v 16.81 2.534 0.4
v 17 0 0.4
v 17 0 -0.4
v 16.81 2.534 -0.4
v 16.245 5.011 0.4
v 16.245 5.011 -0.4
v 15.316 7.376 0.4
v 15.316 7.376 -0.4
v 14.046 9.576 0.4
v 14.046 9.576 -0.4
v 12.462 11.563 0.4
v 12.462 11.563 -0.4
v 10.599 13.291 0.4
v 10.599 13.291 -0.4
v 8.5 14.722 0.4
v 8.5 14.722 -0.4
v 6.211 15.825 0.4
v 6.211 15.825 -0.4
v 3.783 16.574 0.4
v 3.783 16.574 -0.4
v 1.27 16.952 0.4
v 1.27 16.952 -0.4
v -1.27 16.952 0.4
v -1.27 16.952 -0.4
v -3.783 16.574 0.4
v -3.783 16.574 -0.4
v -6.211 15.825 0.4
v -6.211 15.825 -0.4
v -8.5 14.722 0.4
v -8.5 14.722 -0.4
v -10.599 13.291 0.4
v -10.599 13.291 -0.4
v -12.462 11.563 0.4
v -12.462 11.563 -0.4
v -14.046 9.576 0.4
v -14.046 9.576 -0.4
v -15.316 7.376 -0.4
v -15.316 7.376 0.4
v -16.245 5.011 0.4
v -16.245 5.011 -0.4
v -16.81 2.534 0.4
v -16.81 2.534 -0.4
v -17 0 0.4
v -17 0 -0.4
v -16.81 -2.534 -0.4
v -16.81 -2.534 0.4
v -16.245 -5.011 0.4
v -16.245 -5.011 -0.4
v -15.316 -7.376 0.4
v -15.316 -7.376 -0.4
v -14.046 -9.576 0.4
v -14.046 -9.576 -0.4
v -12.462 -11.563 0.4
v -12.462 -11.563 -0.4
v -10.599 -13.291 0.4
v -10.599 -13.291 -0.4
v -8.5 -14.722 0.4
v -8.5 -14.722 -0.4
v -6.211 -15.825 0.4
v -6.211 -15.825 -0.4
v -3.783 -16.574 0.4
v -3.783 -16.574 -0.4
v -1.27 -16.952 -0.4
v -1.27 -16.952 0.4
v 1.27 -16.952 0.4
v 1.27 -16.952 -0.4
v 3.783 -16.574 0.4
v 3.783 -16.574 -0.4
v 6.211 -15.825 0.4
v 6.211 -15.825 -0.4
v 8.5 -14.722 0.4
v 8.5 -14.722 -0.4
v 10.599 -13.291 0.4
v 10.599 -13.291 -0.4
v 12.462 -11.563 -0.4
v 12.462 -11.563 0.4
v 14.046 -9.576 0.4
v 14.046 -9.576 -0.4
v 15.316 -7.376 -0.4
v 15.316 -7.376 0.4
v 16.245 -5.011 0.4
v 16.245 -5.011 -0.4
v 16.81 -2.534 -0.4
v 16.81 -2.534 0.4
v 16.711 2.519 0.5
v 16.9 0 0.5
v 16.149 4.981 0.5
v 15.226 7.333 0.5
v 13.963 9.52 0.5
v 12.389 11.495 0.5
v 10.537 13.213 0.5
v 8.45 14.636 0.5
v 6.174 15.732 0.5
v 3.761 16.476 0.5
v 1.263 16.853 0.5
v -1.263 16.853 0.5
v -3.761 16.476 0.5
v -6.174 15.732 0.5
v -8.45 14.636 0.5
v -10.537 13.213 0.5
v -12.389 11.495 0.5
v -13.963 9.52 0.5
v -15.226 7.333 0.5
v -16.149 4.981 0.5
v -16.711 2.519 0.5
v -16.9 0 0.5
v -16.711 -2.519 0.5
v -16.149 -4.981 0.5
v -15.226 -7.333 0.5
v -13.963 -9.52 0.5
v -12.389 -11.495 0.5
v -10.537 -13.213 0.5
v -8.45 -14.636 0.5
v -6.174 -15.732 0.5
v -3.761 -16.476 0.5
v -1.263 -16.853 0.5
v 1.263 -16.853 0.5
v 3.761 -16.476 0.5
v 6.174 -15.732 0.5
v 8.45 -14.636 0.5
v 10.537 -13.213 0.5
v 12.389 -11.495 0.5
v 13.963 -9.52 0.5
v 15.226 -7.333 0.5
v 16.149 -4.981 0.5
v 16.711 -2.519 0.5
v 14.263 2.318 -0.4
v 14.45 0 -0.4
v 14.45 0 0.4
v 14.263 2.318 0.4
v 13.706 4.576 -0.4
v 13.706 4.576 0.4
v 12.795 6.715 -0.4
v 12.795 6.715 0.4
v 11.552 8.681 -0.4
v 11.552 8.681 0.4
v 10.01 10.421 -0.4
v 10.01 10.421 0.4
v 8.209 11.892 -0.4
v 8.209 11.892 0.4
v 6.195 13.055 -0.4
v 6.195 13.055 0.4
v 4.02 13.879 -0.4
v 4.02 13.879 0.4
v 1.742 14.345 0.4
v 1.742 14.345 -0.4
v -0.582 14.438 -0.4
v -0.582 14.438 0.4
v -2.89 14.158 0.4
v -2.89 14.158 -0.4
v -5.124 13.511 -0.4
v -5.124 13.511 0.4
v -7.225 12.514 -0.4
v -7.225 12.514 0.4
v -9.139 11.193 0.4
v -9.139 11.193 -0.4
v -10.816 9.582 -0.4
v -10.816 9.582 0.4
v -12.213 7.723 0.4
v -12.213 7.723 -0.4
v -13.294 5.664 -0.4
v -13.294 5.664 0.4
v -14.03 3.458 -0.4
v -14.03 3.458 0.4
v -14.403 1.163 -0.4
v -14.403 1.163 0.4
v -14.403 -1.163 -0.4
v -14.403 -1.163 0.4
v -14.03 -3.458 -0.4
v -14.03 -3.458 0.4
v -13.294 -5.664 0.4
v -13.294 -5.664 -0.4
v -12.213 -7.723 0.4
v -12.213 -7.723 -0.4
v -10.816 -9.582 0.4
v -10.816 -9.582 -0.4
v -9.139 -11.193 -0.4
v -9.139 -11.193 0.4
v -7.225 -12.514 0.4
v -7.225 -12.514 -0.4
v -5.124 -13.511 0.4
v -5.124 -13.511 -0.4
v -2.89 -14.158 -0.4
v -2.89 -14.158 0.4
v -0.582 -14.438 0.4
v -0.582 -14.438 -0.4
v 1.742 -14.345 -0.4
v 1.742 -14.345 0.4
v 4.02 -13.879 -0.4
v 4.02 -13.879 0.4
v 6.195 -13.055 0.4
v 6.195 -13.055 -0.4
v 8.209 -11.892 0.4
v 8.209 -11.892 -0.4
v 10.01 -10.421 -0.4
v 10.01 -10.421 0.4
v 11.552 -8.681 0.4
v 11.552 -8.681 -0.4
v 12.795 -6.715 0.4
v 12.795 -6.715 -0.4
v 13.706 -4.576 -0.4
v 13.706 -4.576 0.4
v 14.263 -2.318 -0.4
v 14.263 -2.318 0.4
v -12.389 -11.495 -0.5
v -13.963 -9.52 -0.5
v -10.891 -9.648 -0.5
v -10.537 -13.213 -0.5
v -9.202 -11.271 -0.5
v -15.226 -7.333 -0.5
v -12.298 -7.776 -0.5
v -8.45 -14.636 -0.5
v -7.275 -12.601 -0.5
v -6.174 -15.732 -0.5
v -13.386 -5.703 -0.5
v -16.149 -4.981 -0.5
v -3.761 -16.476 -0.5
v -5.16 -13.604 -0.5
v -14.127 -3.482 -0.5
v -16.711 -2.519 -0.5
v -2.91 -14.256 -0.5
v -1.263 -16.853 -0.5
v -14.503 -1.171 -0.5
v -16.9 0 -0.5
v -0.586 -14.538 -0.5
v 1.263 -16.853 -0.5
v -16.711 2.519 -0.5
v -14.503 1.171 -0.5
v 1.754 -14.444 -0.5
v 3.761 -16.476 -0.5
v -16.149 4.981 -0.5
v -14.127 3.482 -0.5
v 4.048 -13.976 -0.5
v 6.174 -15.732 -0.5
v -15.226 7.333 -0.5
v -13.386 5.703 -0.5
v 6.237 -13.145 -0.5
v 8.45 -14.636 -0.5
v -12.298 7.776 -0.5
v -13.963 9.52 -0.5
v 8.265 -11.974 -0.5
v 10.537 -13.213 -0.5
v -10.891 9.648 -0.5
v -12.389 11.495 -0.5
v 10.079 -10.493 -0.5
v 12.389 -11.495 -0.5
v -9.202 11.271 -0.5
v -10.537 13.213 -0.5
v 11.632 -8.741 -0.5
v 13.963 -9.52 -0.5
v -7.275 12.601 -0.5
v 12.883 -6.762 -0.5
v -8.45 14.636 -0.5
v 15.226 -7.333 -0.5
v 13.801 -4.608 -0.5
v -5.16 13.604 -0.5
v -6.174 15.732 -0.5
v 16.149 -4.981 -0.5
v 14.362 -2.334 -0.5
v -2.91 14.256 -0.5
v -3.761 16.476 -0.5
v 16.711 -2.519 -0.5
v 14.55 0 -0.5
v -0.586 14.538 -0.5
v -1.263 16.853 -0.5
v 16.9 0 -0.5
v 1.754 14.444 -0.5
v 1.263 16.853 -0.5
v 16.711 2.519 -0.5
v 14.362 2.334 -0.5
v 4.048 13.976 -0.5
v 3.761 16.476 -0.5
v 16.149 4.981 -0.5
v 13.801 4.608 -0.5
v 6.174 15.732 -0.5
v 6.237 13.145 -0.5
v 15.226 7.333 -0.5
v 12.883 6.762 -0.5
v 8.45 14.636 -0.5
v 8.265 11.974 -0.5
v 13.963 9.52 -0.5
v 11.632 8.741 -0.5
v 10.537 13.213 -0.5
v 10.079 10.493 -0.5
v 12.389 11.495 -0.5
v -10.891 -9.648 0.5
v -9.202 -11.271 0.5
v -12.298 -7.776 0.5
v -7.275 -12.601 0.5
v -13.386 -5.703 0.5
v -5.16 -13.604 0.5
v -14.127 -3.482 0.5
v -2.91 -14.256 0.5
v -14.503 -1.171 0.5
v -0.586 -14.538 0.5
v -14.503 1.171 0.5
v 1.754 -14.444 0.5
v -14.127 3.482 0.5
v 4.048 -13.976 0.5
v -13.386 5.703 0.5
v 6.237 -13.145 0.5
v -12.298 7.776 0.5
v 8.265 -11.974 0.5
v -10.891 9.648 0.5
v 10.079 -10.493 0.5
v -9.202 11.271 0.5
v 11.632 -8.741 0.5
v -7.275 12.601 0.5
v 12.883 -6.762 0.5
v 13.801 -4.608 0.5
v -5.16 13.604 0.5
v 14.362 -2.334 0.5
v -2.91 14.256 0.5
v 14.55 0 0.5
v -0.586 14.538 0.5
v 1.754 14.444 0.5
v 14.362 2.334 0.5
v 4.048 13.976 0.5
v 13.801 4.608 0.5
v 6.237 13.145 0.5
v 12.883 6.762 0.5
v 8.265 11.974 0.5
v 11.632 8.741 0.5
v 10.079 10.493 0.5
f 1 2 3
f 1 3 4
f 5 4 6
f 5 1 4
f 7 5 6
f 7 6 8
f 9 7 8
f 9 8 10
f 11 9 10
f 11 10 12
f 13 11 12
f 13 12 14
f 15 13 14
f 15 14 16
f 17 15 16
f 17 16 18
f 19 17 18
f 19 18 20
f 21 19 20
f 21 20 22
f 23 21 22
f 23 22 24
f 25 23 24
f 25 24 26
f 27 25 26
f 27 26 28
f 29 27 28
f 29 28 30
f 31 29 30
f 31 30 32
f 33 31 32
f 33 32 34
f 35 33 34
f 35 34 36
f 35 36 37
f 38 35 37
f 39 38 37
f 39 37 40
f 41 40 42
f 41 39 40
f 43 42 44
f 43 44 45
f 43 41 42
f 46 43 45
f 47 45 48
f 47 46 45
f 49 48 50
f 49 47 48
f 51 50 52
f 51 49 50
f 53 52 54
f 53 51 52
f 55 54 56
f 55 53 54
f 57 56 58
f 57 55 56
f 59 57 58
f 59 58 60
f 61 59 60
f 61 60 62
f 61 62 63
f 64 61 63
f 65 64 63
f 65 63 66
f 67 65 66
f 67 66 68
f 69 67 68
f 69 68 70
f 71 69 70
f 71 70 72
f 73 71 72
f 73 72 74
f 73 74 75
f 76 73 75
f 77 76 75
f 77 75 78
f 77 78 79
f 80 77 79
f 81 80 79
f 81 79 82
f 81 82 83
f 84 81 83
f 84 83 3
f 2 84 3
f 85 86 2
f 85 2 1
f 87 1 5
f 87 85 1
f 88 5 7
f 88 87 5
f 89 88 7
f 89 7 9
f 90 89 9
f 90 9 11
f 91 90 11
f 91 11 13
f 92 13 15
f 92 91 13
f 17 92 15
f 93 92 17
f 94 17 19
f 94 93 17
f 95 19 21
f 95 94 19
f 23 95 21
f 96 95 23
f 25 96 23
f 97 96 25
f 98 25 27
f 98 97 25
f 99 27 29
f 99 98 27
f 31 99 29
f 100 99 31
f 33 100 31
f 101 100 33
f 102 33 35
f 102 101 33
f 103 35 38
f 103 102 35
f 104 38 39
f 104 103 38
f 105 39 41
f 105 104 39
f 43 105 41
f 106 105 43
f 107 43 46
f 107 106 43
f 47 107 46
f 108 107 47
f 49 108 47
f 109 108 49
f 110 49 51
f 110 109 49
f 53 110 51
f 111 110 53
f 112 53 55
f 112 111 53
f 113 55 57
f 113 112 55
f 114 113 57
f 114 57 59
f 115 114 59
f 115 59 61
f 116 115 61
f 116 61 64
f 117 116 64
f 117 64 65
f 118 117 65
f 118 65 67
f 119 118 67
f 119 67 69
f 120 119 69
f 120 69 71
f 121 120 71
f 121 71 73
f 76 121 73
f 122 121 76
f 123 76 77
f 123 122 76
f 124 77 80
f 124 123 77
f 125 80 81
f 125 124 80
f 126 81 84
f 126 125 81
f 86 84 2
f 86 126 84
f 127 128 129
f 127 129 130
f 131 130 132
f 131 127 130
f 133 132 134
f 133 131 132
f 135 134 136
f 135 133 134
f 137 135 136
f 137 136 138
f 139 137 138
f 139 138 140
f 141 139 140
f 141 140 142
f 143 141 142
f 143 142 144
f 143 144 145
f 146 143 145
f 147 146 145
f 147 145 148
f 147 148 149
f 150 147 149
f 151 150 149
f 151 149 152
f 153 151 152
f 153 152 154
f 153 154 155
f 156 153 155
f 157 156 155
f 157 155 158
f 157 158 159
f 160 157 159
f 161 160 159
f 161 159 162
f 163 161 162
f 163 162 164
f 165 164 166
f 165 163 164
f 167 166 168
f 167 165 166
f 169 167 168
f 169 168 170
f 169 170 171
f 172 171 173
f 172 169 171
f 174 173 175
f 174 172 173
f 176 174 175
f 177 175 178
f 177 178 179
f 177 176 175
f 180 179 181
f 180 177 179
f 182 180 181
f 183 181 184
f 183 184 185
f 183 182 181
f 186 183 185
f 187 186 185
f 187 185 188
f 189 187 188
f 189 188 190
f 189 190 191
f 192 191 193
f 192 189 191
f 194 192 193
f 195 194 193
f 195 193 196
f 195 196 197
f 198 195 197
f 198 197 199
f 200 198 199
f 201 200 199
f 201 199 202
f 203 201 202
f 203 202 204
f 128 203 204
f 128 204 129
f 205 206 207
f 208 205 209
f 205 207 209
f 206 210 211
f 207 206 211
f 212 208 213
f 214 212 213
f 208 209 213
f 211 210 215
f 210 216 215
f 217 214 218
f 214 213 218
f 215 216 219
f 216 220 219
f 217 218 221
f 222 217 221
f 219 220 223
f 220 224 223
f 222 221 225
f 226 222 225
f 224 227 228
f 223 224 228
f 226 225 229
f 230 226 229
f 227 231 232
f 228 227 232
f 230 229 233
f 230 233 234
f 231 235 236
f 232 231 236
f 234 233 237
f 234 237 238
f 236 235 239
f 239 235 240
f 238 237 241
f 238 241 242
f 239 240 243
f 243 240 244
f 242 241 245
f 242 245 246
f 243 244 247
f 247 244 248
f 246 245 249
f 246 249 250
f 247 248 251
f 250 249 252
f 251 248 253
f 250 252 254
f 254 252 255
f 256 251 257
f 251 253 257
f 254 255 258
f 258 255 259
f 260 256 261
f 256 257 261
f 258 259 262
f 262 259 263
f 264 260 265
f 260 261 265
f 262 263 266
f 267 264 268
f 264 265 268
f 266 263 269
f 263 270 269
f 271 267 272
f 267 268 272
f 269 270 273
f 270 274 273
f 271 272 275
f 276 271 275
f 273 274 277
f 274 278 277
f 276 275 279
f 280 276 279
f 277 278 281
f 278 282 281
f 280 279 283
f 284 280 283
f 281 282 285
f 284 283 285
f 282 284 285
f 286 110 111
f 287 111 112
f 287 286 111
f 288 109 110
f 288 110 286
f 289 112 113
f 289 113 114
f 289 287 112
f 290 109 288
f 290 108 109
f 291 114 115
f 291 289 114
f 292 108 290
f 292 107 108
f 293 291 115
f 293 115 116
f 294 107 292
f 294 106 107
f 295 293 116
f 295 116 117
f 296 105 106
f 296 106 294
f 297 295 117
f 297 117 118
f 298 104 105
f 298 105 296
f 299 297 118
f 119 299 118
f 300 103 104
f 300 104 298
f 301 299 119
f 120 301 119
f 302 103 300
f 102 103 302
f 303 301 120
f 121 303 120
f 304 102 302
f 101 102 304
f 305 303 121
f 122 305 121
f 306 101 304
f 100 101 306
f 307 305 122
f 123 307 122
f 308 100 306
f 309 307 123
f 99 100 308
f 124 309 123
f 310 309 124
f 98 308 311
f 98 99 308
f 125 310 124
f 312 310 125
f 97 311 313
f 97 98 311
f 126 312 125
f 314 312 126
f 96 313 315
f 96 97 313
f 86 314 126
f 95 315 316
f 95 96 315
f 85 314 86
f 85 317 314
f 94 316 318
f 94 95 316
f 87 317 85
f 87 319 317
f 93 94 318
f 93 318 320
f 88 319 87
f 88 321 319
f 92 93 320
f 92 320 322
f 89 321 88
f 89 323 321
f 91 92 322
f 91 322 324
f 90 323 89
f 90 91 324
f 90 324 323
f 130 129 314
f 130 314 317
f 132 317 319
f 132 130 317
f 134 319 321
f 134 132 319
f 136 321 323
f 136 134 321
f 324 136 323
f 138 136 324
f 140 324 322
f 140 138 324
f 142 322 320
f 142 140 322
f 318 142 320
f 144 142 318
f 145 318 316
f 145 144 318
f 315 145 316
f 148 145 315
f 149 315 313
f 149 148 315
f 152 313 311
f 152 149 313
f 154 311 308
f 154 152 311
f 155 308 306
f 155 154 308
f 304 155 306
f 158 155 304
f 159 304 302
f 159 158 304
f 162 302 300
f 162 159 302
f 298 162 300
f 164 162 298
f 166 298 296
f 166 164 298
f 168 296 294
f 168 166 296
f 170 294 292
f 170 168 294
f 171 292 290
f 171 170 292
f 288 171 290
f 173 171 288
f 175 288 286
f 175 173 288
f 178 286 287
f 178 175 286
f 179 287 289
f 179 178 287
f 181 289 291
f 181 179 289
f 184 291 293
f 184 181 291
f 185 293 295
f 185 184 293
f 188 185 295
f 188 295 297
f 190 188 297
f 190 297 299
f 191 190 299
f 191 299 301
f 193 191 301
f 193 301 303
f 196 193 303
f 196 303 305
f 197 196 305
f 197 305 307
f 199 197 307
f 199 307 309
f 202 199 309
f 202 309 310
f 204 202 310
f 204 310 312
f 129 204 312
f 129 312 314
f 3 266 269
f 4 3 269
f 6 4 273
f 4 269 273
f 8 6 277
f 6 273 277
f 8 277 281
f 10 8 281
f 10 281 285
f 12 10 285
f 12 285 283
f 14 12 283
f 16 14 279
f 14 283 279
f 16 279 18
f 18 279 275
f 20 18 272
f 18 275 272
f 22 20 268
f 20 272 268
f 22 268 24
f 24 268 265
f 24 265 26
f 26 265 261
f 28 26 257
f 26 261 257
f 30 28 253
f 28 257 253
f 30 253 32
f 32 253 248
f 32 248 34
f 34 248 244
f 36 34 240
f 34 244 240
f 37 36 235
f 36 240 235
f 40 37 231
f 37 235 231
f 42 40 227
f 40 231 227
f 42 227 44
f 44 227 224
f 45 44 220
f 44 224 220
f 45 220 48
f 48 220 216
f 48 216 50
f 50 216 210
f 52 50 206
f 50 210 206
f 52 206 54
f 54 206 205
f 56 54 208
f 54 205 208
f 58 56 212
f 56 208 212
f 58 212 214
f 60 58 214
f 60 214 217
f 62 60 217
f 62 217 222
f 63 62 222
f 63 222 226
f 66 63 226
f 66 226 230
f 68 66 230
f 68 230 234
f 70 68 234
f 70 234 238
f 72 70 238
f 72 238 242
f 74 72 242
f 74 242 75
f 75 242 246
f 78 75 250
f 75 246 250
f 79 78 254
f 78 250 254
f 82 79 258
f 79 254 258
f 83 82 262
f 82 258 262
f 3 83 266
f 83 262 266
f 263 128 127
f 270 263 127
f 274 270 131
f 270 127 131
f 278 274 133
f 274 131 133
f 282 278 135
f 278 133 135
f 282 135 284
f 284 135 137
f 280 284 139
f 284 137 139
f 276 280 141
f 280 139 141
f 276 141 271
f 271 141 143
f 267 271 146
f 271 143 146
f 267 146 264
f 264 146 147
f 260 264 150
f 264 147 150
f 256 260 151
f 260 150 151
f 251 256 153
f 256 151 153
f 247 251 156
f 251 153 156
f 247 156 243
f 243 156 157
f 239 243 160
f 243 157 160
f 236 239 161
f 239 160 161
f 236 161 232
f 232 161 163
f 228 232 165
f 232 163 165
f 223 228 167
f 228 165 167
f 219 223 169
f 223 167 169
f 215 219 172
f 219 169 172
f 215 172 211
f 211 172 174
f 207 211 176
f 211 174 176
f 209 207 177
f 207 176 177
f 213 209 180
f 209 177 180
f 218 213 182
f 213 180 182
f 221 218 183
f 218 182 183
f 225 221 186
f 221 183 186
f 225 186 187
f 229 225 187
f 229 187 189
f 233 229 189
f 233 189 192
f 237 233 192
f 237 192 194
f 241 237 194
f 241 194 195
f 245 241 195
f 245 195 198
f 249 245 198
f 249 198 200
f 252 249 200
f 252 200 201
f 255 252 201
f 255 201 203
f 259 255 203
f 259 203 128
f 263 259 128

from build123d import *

# Parameters (mm, degrees)
F0_R     = 17
F0_R_2   = 16
F0_R_3   = 14.45
F1_DEPTH = 0.5
F2_SIZE  = 0.1
F4_SIZE  = 0.1


with BuildPart() as f1:
    # F0 (on Top) → F1 (new body, symmetric)
    with BuildSketch(Plane.XY):
        Circle(F0_R)
        Circle(F0_R_2, mode=Mode.SUBTRACT)
        Circle(F0_R_2)
        Circle(F0_R_3, mode=Mode.SUBTRACT)
    extrude(amount=F1_DEPTH, both=True)

    # F2
    f2_edges = [f1.edges().sort_by_distance(p)[0] for p in [
        (-17, 0, 0.5),
        (-17, 0, -0.5),
    ]]
    chamfer(f2_edges, length=F2_SIZE)

    # F4
    f4_edges = [f1.edges().sort_by_distance(p)[0] for p in [
        (-14.45, 0, 0.5),
        (-14.45, 0, -0.5),
    ]]
    chamfer(f4_edges, length=F4_SIZE)


solid = f1.part
